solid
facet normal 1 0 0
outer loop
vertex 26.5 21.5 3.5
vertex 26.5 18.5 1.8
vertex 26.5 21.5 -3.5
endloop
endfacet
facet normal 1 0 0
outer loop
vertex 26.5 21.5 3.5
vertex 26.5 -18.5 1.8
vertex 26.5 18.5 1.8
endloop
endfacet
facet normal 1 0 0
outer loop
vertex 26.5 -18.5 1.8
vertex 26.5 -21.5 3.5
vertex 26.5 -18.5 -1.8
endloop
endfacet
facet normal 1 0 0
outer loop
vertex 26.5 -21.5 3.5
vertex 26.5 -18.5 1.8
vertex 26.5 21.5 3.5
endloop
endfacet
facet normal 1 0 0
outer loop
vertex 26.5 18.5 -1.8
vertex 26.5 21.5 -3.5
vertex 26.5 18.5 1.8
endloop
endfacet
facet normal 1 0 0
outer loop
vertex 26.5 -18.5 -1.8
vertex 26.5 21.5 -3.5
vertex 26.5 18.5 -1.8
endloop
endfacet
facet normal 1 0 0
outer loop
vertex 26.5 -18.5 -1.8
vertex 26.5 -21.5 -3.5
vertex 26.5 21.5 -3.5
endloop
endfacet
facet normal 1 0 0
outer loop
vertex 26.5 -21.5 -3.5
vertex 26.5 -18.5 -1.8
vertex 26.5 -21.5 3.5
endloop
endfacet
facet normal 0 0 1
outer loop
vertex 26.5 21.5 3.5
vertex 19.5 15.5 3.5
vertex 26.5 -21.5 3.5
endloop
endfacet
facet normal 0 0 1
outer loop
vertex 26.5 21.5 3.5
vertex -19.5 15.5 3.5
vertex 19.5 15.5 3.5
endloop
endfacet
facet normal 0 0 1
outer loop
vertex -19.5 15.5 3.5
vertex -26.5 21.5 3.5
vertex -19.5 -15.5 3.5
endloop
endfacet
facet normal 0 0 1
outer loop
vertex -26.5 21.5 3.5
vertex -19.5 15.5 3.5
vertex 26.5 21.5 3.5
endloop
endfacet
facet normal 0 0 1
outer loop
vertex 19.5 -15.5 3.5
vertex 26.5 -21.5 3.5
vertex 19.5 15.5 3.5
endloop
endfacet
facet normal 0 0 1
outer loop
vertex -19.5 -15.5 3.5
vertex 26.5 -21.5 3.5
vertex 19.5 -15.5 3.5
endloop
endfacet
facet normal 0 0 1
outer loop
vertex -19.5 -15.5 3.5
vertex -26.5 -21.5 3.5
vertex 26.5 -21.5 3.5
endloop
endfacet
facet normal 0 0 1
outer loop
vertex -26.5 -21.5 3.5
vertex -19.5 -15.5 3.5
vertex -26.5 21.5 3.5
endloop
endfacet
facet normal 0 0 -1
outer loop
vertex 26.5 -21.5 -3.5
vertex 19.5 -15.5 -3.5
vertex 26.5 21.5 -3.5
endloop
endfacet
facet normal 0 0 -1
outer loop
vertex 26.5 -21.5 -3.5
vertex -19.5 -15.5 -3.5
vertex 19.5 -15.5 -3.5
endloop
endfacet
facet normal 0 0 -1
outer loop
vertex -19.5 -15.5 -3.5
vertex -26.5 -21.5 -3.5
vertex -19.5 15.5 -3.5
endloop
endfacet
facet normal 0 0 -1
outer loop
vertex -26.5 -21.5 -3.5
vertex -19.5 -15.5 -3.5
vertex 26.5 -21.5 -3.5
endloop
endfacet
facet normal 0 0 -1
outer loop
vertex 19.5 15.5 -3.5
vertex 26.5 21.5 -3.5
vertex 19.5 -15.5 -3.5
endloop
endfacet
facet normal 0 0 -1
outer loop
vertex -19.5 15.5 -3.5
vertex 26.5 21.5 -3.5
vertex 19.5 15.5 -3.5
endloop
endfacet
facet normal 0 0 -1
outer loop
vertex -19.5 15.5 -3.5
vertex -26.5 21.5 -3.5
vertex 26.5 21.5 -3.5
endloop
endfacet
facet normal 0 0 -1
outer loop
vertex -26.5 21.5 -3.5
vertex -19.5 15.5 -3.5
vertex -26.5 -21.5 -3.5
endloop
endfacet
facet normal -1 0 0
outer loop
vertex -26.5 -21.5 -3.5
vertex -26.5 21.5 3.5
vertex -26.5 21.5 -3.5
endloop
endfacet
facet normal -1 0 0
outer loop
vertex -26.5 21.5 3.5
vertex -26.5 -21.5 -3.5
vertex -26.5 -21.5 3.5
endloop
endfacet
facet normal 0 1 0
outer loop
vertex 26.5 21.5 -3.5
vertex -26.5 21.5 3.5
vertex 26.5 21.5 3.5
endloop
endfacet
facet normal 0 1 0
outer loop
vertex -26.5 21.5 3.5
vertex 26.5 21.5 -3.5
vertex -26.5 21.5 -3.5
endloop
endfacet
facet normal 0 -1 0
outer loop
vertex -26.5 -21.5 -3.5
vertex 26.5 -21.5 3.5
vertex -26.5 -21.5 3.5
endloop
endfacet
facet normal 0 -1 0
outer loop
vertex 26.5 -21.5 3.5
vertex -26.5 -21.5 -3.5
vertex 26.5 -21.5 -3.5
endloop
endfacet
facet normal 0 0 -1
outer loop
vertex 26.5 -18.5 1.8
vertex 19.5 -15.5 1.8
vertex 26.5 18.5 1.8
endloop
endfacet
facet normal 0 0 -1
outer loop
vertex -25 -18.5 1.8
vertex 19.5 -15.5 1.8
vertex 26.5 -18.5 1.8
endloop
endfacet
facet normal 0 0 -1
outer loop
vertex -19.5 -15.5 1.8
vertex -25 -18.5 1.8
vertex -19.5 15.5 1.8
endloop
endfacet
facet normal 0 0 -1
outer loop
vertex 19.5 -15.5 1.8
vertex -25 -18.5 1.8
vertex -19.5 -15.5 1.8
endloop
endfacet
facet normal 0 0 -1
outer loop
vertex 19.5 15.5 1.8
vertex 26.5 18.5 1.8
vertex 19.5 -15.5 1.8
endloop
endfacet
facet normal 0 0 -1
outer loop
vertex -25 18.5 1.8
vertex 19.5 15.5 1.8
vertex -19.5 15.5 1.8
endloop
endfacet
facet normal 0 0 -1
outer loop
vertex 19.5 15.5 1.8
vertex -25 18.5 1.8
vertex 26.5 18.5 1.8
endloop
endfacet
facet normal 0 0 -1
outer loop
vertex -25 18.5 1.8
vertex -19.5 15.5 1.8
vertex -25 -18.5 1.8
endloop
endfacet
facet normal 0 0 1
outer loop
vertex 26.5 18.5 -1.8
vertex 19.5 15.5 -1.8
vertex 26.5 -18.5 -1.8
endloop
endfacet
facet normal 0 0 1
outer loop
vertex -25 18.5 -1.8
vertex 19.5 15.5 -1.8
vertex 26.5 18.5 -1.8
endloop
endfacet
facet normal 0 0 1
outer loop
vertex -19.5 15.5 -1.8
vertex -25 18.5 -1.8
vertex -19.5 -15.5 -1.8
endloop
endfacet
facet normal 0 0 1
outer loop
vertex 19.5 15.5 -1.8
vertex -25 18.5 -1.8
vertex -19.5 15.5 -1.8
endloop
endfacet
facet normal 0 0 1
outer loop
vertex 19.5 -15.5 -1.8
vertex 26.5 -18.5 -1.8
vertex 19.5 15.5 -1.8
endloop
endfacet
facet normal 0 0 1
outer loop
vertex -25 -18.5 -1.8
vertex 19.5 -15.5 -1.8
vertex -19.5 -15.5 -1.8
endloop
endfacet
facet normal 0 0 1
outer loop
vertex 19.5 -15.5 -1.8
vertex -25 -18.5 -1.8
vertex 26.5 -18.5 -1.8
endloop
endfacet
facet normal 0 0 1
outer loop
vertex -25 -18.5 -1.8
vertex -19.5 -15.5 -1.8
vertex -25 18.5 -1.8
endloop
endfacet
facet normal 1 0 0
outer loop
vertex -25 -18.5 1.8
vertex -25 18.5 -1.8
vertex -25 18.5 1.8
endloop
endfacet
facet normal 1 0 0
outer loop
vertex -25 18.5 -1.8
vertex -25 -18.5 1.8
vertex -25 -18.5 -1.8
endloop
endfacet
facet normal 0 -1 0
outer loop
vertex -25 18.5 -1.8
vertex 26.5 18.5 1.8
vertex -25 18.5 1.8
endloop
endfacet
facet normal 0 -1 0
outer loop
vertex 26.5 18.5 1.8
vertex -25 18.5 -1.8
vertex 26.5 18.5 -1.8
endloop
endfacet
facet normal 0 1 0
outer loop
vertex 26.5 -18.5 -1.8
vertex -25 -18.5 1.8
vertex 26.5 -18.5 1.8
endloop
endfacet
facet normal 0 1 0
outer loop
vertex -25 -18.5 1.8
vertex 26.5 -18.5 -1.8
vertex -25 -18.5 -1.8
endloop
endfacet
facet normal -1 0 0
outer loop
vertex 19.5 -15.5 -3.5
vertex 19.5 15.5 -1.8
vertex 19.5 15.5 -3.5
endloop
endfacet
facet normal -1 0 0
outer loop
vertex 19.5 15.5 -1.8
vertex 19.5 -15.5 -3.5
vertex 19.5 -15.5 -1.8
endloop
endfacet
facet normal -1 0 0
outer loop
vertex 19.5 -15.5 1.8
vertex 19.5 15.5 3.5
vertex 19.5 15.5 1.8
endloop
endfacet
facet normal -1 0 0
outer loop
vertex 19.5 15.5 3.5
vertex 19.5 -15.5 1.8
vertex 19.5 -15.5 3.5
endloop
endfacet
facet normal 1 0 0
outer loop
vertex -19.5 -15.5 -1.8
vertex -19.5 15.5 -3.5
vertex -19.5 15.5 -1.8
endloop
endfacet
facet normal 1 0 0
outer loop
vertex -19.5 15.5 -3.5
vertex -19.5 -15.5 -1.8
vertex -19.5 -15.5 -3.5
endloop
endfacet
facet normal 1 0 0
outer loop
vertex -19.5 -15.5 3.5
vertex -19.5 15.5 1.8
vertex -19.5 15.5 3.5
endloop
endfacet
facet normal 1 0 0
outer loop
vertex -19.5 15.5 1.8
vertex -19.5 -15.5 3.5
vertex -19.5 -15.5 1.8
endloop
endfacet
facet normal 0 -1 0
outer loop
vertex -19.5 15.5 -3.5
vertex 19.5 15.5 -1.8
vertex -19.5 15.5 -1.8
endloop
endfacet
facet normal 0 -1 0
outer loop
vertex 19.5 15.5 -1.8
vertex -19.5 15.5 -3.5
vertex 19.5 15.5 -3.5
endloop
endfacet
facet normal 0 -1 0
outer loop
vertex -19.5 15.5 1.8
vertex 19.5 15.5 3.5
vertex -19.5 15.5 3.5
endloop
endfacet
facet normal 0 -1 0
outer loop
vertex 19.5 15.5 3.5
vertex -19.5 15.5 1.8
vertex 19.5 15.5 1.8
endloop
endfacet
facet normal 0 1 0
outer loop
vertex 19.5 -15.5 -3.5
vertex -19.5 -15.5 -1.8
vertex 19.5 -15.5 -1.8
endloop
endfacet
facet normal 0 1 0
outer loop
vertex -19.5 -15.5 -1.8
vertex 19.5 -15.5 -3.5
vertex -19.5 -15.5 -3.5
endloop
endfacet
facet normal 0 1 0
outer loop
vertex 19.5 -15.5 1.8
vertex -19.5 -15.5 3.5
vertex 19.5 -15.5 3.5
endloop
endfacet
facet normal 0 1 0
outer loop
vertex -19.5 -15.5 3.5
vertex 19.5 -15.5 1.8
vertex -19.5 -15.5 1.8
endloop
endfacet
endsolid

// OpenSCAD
module rfid_antenna_housing(){
	difference(){
		cube([53,43,7], center=true); // rfid antenna outside;
		translate([3,0,0]) cube([56,37,3.6], center=true); // rfid antenna groove;
		cube([39,31,30], center=true); //rfid antenna loop inside  
	}
}

rfid_antenna_housing();
